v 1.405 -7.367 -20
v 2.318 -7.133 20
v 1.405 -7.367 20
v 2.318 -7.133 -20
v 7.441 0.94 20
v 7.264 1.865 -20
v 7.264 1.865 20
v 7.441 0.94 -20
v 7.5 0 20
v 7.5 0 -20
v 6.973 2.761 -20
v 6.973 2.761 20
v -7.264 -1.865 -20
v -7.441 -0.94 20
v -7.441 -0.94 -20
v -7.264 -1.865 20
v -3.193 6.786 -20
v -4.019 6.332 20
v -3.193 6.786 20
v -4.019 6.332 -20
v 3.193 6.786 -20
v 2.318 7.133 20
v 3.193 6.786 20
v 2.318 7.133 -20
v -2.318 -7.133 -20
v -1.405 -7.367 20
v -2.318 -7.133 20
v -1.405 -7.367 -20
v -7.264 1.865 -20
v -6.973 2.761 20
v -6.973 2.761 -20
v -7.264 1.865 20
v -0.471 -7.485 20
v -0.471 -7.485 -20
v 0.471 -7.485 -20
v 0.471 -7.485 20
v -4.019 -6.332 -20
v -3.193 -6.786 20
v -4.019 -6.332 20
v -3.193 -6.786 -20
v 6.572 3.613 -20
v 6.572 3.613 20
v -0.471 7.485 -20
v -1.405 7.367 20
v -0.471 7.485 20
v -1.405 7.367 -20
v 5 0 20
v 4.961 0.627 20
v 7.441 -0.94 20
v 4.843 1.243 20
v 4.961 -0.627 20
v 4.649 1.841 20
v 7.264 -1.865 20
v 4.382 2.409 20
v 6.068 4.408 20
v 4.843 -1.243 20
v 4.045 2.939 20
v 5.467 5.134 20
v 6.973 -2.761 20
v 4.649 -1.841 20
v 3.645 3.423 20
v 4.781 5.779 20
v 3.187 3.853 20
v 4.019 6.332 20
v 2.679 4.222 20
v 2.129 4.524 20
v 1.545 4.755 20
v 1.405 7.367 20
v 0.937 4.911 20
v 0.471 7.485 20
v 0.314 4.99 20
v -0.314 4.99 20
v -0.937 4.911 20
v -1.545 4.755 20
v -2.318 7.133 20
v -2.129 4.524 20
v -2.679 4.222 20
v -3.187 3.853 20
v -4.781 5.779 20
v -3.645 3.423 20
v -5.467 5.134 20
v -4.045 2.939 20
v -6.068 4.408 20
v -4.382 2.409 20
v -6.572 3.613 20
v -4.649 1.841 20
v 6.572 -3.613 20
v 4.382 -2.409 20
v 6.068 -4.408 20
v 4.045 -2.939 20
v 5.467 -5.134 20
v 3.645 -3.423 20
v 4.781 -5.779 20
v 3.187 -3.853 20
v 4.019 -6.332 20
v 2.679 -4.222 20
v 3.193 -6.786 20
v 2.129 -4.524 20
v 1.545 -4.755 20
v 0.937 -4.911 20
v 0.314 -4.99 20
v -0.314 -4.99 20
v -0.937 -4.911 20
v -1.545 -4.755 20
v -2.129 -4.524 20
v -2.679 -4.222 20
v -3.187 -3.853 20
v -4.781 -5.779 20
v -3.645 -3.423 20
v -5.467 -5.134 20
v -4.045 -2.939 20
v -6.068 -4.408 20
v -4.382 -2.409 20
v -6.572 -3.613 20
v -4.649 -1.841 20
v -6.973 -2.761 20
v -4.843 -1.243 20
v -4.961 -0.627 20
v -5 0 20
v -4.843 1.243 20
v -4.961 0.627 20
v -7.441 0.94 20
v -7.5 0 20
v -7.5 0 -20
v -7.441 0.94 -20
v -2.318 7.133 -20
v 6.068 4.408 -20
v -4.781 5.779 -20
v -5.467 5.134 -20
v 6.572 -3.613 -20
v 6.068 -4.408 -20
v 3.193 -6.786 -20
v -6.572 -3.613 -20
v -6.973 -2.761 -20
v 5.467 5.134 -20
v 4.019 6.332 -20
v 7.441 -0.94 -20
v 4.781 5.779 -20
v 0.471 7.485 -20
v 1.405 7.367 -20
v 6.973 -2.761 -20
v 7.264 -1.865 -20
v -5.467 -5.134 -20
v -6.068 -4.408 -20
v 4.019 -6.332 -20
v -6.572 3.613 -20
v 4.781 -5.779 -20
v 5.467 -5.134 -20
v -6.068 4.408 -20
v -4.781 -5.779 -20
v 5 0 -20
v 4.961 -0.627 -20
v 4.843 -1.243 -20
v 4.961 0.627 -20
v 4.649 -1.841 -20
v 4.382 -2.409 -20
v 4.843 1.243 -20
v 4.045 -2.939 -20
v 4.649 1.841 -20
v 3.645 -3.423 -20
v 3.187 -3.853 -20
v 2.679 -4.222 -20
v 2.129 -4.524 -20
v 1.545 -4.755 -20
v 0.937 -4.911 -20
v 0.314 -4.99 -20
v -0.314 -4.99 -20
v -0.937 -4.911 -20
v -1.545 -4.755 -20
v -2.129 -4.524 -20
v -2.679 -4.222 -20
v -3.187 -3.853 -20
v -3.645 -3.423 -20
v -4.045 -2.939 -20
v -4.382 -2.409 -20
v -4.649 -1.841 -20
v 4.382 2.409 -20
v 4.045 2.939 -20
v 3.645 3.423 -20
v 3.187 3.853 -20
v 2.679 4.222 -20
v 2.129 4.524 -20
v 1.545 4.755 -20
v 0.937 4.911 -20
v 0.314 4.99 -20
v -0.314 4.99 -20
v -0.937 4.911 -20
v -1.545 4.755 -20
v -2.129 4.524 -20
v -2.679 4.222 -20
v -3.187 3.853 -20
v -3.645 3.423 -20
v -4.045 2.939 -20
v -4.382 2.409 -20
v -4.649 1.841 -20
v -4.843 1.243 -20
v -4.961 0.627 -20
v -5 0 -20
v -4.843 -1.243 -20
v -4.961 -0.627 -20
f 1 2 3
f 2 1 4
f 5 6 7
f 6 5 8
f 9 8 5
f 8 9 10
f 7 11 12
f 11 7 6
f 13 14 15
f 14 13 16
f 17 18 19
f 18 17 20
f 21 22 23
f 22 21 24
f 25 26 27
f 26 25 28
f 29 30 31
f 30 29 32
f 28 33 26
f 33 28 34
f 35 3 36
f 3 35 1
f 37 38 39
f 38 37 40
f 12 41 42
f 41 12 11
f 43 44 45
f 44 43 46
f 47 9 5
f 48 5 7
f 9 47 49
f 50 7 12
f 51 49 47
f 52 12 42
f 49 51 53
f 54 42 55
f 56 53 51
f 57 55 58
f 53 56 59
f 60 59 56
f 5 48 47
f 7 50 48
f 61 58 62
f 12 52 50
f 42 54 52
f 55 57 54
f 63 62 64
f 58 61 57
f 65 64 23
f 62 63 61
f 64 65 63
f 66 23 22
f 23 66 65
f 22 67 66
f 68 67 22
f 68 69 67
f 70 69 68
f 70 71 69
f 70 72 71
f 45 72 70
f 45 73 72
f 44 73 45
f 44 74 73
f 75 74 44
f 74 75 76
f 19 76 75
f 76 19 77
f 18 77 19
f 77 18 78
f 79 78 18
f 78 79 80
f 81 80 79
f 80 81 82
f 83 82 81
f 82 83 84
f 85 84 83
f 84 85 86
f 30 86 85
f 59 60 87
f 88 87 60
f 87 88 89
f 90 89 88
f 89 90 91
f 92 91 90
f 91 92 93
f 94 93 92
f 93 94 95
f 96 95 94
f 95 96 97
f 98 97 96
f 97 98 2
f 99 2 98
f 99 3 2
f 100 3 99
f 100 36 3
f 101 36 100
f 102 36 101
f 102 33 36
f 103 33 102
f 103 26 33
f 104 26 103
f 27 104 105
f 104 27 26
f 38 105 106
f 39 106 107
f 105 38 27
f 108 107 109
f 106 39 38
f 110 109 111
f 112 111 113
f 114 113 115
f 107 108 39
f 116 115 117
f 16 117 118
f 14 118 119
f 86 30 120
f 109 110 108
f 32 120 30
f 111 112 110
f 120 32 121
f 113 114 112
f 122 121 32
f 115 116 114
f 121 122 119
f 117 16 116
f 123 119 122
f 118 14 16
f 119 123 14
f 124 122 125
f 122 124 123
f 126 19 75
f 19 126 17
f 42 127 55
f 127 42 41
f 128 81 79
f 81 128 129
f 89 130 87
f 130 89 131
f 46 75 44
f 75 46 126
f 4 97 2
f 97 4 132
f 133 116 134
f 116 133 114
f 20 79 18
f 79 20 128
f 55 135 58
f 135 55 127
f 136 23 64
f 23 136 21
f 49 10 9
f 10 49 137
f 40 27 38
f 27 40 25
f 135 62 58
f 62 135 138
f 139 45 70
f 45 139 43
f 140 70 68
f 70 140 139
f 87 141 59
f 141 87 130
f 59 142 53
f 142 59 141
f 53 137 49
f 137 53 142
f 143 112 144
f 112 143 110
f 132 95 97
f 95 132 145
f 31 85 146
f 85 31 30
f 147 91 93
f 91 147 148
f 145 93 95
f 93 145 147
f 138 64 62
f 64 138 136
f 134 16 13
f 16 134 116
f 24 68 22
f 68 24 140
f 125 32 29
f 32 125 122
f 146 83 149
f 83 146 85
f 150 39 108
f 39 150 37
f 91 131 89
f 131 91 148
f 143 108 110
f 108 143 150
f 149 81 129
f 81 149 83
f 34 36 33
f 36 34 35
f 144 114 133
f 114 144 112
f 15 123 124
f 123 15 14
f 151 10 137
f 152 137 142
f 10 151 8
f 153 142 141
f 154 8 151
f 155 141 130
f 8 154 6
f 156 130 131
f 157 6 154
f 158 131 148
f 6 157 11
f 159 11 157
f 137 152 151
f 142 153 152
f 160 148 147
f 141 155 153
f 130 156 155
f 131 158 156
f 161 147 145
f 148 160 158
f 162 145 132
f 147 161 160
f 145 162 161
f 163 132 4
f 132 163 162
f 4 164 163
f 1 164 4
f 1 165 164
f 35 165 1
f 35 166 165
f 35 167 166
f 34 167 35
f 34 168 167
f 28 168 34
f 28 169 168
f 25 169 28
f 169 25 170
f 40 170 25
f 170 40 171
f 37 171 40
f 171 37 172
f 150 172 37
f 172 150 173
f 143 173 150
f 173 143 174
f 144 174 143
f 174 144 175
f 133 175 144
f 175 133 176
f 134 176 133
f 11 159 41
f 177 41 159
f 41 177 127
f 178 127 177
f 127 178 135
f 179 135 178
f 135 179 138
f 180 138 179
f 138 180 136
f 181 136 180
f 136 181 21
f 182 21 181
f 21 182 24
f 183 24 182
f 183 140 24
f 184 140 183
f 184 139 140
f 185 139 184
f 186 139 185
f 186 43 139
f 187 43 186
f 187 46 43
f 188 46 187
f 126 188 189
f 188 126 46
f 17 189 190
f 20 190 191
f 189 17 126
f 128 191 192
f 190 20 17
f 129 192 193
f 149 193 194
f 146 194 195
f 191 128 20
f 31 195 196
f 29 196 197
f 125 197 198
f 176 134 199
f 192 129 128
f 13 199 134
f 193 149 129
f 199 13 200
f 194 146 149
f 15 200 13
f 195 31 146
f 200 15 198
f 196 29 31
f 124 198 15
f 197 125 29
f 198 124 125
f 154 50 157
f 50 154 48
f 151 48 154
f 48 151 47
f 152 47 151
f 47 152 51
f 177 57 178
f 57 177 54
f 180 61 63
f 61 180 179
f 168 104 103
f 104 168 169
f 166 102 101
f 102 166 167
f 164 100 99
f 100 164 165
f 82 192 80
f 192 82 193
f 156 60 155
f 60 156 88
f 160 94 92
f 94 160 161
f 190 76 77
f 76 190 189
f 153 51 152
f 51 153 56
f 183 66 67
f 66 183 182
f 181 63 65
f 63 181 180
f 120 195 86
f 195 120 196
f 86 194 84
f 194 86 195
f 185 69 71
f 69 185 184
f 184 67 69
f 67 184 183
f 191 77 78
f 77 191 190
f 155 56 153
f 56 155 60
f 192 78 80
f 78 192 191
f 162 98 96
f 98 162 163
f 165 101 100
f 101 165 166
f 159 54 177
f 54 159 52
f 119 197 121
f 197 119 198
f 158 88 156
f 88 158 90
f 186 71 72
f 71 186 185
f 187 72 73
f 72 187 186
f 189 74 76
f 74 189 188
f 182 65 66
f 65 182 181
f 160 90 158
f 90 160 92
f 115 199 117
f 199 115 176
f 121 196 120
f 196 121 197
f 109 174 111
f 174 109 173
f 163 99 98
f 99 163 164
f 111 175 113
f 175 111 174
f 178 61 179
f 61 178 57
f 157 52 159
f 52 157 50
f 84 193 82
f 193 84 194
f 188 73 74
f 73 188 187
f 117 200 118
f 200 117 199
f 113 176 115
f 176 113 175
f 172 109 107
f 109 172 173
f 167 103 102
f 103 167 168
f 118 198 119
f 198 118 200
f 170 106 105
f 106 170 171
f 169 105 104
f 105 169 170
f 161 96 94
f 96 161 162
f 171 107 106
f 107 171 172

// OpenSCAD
$fn = 50;


difference() {
	union() {
		translate(v = [0, 0, -20.0000000000]) {
			cylinder(h = 40, r = 7.5000000000);
		}
	}
	union() {
		translate(v = [0, 0, -100.0000000000]) {
			cylinder(h = 200, r = 5.0000000000);
		}
	}
}
